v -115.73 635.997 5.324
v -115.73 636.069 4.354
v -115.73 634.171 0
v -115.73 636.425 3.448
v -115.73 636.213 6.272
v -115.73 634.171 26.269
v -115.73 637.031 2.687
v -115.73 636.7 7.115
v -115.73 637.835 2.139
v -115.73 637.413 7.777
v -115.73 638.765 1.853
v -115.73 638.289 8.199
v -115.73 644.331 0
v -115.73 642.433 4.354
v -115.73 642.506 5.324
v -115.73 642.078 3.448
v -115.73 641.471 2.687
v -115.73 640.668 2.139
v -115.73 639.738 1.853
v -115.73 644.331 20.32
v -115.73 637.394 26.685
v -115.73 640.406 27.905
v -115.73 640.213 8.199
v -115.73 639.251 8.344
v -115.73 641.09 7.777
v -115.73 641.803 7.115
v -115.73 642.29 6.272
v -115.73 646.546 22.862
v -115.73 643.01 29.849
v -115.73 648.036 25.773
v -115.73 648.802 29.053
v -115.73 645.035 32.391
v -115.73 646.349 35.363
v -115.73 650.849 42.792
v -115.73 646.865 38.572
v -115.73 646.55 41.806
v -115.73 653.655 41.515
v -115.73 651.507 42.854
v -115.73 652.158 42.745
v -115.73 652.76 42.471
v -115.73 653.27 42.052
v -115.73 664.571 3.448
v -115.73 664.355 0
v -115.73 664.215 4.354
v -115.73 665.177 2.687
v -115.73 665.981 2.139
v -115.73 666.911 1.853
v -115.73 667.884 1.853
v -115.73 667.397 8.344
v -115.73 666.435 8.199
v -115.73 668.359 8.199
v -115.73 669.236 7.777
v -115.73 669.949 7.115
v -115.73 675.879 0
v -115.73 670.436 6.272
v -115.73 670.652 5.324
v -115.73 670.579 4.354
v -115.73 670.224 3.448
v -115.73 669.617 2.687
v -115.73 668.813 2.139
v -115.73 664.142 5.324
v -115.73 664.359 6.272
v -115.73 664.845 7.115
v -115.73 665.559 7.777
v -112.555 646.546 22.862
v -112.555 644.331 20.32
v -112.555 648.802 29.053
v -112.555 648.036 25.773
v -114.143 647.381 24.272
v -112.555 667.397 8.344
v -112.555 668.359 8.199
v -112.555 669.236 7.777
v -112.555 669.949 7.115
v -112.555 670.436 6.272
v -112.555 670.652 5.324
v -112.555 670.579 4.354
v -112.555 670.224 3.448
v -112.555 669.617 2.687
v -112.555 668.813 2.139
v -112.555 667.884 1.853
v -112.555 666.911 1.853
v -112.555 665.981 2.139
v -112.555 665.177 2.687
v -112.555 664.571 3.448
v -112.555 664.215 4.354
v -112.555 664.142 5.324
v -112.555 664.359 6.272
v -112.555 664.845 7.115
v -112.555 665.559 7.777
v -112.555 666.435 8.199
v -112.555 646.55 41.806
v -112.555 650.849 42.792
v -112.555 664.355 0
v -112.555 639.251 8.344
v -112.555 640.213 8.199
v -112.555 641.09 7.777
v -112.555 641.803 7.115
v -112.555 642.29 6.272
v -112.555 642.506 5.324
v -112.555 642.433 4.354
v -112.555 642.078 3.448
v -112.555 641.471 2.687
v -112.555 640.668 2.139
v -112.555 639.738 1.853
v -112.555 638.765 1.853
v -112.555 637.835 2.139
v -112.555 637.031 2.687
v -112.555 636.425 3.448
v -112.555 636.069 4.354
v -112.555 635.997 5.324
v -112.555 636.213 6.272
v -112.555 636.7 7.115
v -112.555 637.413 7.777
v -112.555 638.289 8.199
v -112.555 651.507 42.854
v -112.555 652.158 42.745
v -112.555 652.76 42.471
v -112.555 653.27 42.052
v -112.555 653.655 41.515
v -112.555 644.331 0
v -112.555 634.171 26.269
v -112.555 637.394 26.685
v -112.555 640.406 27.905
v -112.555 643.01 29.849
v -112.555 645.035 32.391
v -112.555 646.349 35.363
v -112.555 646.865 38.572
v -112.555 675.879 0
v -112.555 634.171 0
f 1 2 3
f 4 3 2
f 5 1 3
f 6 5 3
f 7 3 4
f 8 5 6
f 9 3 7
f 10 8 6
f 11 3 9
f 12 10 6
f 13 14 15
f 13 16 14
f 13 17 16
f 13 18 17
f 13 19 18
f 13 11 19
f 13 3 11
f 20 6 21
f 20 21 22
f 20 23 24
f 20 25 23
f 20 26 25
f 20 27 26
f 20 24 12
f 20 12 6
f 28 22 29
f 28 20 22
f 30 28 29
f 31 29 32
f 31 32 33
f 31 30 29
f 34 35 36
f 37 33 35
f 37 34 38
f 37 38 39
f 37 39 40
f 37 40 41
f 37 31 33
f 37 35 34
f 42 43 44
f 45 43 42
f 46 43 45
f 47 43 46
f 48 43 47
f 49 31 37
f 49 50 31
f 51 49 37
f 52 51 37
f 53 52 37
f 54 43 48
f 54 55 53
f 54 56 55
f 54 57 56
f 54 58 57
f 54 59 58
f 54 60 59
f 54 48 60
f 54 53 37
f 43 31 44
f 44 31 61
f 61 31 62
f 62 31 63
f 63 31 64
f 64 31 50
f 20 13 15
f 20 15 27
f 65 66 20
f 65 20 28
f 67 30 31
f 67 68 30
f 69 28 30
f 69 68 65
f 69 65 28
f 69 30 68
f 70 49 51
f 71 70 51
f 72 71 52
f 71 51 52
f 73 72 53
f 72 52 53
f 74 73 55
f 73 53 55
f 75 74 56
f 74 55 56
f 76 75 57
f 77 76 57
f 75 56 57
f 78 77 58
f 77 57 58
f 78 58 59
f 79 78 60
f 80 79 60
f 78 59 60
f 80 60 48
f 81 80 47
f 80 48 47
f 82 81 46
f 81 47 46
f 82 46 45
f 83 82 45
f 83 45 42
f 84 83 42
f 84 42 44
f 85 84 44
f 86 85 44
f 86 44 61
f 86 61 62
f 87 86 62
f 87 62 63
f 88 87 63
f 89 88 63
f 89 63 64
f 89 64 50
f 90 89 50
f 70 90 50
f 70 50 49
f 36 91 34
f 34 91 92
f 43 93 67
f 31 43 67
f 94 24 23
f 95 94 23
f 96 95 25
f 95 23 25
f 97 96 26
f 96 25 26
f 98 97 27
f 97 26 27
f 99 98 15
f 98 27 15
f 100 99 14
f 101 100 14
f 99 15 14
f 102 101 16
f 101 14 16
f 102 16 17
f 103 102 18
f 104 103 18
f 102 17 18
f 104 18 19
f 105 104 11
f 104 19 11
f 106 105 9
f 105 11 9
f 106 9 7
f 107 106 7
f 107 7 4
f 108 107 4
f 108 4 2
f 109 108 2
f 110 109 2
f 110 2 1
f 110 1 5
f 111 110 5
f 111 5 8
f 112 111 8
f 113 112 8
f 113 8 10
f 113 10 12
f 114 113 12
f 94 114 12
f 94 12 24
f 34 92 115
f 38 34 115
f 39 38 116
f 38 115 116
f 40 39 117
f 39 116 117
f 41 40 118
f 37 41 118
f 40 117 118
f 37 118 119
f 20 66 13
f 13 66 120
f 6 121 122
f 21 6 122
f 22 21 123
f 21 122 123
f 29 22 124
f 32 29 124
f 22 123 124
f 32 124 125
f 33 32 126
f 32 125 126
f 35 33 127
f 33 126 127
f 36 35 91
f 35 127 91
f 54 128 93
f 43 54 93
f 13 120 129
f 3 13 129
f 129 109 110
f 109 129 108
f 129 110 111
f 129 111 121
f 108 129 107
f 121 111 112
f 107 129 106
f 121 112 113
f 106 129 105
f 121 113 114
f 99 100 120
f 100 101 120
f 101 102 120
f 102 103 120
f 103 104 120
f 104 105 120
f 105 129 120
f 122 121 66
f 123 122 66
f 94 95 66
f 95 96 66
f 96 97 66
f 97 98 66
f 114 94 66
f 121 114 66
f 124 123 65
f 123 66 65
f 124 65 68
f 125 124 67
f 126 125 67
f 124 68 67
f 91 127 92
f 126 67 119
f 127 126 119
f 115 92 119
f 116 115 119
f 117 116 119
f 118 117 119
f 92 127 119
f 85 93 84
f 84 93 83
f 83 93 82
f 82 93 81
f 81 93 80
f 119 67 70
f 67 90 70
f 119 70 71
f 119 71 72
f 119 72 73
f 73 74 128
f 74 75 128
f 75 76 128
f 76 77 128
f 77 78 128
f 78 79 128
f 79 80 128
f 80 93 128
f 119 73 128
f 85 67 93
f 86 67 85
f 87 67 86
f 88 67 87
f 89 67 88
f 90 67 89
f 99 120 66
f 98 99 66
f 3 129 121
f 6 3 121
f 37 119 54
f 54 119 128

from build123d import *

# Parameters (mm, degrees)
BOSS_EXTRUDE1_DEPTH = 3.175
SKETCH7_R           = 3.2639
CUT_EXTRUDE3_DEPTH  = 678.24348403


with BuildPart() as part:
    # Sketch2 → Boss-Extrude1 (new body)
    with BuildSketch(Plane(origin=(-112.555, 0, -573.58969557), x_dir=(0, 0.6231241879767124, 0.7821229100073485), z_dir=(-1, 0, 0))):
        with BuildLine():
            Line((843.785187932, 138.582376841), (864.330586832, 122.213677187))
            ThreePointArc((864.330586832, 122.213677187), (874.263547789, 127), (884.196508746, 122.213677187))
            Line((884.196508746, 122.213677187), (887.645495372, 124.961515108))
            ThreePointArc((887.645495372, 124.961515108), (888.526447304, 126.330171585), (888.395706135, 127.952578317))
            Line((888.395706135, 127.952578317), (869.77401473, 171.202610873))
            Line((869.77401473, 171.202610873), (862.593047153, 162.189320479))
            Line((862.593047153, 162.189320479), (875.624929298, 131.921966414))
            add(Edge.make_bspline(
                [(866.008867214, 133.866862107), (871.18323177, 134.685144315), (875.624929298, 131.921966414)],
                knots=[0, 0, 0, 1, 1, 1], degree=2))
            Line((866.008867214, 133.866862107), (850.116129682, 146.528745607))
            Line((850.116129682, 146.528745607), (843.785187932, 138.582376841))
        make_face()
    extrude(amount=BOSS_EXTRUDE1_DEPTH)

    # Sketch7 → Cut-Extrude3 (cut, through all)
    with BuildSketch(Plane.ZY.offset(115.73)):
        with Locations((5.08, 639.251411908)):
            Circle(SKETCH7_R)
        with Locations((5.08, 667.397263635)):
            Circle(SKETCH7_R)
    extrude(amount=-CUT_EXTRUDE3_DEPTH, mode=Mode.SUBTRACT)


solid = part.part
